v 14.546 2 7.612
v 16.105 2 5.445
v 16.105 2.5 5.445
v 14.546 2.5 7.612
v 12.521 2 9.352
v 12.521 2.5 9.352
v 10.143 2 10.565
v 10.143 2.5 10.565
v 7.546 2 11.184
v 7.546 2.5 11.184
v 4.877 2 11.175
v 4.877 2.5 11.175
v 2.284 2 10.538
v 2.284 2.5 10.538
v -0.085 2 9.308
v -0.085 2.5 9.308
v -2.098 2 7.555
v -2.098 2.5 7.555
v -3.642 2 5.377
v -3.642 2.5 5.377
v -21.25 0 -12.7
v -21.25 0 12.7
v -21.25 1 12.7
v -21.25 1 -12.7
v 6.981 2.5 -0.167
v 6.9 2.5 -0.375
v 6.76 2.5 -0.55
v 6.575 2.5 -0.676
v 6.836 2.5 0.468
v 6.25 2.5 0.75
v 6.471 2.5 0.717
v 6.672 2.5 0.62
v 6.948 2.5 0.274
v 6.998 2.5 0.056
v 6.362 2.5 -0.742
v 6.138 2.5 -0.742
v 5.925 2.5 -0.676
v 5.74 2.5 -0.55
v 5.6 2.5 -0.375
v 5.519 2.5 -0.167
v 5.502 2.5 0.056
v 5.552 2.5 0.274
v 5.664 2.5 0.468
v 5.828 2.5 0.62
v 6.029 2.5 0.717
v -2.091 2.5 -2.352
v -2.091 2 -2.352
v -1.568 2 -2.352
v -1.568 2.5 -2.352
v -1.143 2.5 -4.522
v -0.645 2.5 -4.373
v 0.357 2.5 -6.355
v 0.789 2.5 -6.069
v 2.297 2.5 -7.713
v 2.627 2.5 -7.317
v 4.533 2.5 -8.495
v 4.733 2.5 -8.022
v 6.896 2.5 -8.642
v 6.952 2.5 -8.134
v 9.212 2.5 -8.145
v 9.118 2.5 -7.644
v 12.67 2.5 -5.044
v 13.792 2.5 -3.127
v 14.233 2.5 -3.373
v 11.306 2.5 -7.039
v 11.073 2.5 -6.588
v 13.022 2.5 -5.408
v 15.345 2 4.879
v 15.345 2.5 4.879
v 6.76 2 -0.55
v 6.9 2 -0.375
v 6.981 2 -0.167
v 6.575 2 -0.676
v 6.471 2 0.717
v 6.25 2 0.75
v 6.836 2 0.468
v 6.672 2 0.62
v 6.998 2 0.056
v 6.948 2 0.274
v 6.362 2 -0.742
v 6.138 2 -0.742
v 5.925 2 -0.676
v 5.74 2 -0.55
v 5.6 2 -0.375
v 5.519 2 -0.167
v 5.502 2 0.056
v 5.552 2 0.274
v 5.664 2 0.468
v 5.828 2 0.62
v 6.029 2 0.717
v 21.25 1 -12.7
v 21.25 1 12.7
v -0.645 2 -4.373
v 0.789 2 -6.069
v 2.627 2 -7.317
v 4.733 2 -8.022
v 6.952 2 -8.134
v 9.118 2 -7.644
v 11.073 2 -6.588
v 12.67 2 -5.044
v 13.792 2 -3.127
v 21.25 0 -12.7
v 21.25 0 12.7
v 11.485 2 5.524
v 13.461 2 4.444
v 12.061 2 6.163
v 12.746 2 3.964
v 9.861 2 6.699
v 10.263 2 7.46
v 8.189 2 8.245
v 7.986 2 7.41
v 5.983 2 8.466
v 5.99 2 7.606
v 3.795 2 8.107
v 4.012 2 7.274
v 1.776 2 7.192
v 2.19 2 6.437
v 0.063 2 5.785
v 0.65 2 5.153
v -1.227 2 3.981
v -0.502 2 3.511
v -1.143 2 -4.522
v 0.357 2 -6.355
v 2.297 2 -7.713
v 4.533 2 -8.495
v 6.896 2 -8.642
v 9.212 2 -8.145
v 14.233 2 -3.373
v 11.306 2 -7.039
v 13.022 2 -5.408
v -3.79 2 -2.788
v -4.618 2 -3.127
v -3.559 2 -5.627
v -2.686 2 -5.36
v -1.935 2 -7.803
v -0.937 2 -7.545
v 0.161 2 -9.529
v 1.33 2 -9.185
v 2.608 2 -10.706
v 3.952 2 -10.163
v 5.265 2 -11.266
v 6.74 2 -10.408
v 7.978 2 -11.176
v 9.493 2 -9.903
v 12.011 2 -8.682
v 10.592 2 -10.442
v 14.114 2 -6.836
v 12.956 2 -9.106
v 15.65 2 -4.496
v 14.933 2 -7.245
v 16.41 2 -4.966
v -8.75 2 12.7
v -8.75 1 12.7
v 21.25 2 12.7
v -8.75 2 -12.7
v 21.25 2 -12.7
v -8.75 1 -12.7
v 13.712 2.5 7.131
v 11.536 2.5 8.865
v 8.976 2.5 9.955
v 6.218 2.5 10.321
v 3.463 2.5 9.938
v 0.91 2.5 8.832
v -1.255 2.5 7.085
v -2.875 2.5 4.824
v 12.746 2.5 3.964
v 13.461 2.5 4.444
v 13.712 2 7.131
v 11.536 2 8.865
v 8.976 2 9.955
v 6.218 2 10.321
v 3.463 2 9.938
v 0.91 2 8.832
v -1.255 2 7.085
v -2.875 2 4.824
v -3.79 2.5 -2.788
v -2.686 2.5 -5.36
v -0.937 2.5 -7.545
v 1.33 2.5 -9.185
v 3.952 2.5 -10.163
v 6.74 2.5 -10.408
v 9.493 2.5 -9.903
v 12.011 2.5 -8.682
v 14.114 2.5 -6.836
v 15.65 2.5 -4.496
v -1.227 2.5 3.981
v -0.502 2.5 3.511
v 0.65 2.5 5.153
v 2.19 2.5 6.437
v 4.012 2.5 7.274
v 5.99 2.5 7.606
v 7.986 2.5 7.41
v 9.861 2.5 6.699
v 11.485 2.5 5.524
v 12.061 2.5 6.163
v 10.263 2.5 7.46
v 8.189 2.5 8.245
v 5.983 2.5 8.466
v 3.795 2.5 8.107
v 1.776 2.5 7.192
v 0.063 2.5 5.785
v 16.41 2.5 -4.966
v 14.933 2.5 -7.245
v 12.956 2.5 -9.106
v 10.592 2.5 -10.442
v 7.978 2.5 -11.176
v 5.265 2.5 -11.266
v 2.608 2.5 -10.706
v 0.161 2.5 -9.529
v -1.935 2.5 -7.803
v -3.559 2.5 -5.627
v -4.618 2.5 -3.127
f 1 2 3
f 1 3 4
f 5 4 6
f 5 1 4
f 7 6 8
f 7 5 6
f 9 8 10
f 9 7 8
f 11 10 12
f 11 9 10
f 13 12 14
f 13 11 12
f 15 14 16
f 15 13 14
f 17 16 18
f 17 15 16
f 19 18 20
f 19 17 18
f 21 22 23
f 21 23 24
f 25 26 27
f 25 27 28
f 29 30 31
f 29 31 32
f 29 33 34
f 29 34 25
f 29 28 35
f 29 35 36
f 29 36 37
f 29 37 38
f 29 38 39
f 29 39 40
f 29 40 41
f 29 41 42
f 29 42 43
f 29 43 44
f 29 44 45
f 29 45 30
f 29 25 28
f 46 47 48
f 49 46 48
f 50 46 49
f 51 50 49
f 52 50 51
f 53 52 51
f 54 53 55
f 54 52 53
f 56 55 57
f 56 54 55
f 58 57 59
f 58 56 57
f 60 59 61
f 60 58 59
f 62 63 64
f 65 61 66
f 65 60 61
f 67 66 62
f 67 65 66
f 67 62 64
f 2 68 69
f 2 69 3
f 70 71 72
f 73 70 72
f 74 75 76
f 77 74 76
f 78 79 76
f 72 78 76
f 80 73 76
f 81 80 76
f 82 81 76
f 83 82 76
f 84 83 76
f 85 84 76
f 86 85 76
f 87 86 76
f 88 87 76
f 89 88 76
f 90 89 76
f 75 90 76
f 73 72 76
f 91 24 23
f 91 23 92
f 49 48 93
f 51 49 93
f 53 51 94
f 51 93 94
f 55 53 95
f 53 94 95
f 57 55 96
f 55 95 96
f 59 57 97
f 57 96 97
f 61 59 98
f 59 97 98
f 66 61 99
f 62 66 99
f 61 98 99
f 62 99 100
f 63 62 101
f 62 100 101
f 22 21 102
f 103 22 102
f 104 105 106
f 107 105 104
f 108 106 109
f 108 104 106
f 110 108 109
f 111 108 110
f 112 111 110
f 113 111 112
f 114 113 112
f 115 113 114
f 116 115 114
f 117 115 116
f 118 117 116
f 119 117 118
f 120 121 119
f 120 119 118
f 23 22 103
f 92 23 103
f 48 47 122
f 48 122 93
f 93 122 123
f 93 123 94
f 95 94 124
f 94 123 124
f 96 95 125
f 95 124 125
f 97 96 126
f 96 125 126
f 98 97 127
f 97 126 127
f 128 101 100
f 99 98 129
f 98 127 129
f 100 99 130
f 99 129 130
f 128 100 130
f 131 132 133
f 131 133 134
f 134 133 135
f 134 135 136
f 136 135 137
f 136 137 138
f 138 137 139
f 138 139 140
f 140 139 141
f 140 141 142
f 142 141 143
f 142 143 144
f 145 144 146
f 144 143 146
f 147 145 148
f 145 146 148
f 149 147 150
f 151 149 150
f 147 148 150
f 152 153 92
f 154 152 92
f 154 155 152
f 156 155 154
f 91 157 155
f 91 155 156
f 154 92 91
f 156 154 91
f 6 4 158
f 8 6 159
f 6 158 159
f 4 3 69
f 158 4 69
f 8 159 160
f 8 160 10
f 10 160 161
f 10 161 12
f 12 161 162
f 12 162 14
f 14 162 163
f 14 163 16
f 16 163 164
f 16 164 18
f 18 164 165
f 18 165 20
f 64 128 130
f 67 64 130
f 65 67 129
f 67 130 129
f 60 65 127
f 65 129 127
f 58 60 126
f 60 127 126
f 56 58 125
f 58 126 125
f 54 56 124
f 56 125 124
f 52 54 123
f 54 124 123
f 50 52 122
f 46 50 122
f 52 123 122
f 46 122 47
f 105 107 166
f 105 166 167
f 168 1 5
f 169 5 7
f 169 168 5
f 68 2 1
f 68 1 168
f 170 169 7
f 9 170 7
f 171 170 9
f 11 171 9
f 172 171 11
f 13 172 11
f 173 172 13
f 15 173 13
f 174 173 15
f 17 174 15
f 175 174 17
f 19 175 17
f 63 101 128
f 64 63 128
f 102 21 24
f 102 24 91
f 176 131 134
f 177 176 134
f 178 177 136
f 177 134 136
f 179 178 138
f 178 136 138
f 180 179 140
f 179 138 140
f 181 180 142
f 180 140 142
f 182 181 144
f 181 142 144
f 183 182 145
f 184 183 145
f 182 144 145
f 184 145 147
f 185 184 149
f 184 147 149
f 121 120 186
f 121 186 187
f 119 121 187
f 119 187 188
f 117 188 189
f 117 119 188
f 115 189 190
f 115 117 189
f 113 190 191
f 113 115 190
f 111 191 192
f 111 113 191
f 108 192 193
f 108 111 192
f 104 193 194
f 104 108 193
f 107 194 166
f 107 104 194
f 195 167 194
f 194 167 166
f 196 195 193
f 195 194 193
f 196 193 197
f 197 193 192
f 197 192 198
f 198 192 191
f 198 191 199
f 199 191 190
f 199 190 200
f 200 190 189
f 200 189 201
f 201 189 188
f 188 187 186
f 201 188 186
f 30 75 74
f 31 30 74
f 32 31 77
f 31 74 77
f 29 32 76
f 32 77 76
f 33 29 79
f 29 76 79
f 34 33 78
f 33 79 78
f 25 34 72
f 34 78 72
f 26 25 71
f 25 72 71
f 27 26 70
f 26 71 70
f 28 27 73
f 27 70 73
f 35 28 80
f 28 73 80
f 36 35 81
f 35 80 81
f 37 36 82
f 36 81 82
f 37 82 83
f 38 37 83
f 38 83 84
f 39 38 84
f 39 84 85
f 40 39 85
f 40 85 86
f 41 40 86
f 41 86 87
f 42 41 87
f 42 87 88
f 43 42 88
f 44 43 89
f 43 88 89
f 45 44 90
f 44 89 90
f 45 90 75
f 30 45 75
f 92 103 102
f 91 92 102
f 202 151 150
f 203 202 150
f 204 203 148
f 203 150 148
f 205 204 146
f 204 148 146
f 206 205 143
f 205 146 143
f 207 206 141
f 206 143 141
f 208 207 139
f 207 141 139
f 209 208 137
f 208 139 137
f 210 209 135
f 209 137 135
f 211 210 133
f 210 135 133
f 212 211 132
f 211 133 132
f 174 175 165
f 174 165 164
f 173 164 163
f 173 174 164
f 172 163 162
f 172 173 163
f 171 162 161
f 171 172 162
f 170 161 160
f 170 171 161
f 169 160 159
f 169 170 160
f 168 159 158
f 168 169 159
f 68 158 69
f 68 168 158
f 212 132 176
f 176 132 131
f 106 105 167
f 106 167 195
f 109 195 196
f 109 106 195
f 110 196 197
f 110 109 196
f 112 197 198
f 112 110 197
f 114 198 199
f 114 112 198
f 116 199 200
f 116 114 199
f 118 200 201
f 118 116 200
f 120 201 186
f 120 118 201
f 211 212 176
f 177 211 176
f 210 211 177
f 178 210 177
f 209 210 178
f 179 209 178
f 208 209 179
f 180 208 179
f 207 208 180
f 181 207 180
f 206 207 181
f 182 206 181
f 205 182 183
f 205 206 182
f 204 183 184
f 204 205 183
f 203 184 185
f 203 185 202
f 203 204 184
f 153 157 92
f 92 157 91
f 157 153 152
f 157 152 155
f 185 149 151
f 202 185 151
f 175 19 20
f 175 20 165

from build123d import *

# Parameters (mm, degrees)
SKETCH1_W             = 42.5
SKETCH1_H             = 25.4
BOSS_EXTRUDE1_DEPTH   = 1
SKETCH2_W             = 30
SKETCH2_H             = 25.4
BOSS_EXTRUDE2_DEPTH   = 1
SKETCH3_R             = 0.75
BOSS_EXTRUDE3_DEPTH   = 0.5
BOSS_EXTRUDE3_2_DEPTH = 0.5
BOSS_EXTRUDE3_3_DEPTH = 0.5
BOSS_EXTRUDE3_4_DEPTH = 0.5
BOSS_EXTRUDE3_5_DEPTH = 0.5


with BuildPart() as part:
    # Sketch1 → Boss-Extrude1 (new body)
    with BuildSketch(Plane(origin=(0, 0, 0), x_dir=(1, 0, 0), z_dir=(0, 1, 0))):
        Rectangle(SKETCH1_W, SKETCH1_H)
    extrude(amount=BOSS_EXTRUDE1_DEPTH)


with BuildPart() as body_2:
    # Sketch2 → Boss-Extrude2 (new body)
    with BuildSketch(Plane(origin=(0, 1, 0), x_dir=(1, 0, 0), z_dir=(0, 1, 0))):
        with Locations((6.25, 0)):
            Rectangle(SKETCH2_W, SKETCH2_H)
    extrude(amount=BOSS_EXTRUDE2_DEPTH)


with BuildPart() as body_3:
    # Sketch3 → Boss-Extrude3 (new body)
    with BuildSketch(Plane(origin=(0, 2, 0), x_dir=(1, 0, 0), z_dir=(0, 1, 0))):
        with Locations(Location((6.25, 0, 0), (0, 0, 270))):
            Circle(SKETCH3_R)
    extrude(amount=BOSS_EXTRUDE3_DEPTH)


with BuildPart() as body_4:
    # Sketch3 → Boss-Extrude3 2 (new body)
    with BuildSketch(Plane(origin=(0, 2, 0), x_dir=(1, 0, 0), z_dir=(0, 1, 0))):
        with BuildLine():
            Line((-4.617762535, 3.127091943), (-3.790050383, 2.78808304))
            ThreePointArc((-3.790050383, 2.78808304), (5.337988327, 10.37999294), (15.650040902, 4.496137205))
            Line((15.650040902, 4.496137205), (16.409882045, 4.966262516))
            ThreePointArc((16.409882045, 4.966262516), (5.264651942, 11.26570263), (-4.617762535, 3.127091943))
        make_face()
    extrude(amount=BOSS_EXTRUDE3_2_DEPTH)


with BuildPart() as body_5:
    # Sketch3 → Boss-Extrude3 3 (new body)
    with BuildSketch(Plane(origin=(0, 2, 0), x_dir=(1, 0, 0), z_dir=(0, 1, 0))):
        with BuildLine():
            Line((-2.09106228, 2.352445065), (-1.56829671, 2.352445065))
            ThreePointArc((-1.56829671, 2.352445065), (5.838769057, 8.154179931), (13.791953143, 3.127091943))
            Line((13.791953143, 3.127091943), (14.233285292, 3.372606364))
            ThreePointArc((14.233285292, 3.372606364), (5.70946012, 8.649574231), (-2.09106228, 2.352445065))
        make_face()
    extrude(amount=BOSS_EXTRUDE3_3_DEPTH)


with BuildPart() as body_6:
    # Sketch3 → Boss-Extrude3 4 (new body)
    with BuildSketch(Plane(origin=(0, 2, 0), x_dir=(1, 0, 0), z_dir=(0, 1, 0))):
        with BuildLine():
            Line((12.746422003, -3.964305573), (13.461213429, -4.443507345))
            ThreePointArc((13.461213429, -4.443507345), (5.983271007, -8.466121443), (-1.226623801, -3.980760378))
            Line((-1.226623801, -3.980760378), (-0.502014789, -3.511340741))
            ThreePointArc((-0.502014789, -3.511340741), (5.989949615, -7.606023357), (12.746422003, -3.964305573))
        make_face()
    extrude(amount=BOSS_EXTRUDE3_4_DEPTH)


with BuildPart() as body_7:
    # Sketch3 → Boss-Extrude3 5 (new body)
    with BuildSketch(Plane(origin=(0, 2, 0), x_dir=(1, 0, 0), z_dir=(0, 1, 0))):
        with BuildLine():
            Line((15.34509432, -4.879145321), (16.104935463, -5.445474688))
            ThreePointArc((16.104935463, -5.445474688), (6.211132045, -11.259282252), (-3.642296578, -5.377305642))
            Line((-3.642296578, -5.377305642), (-2.874726628, -4.823501188))
            ThreePointArc((-2.874726628, -4.823501188), (6.218478804, -10.321133957), (15.34509432, -4.879145321))
        make_face()
    extrude(amount=BOSS_EXTRUDE3_5_DEPTH)


solid = Compound([part.part, body_2.part, body_3.part, body_4.part, body_5.part, body_6.part, body_7.part])
